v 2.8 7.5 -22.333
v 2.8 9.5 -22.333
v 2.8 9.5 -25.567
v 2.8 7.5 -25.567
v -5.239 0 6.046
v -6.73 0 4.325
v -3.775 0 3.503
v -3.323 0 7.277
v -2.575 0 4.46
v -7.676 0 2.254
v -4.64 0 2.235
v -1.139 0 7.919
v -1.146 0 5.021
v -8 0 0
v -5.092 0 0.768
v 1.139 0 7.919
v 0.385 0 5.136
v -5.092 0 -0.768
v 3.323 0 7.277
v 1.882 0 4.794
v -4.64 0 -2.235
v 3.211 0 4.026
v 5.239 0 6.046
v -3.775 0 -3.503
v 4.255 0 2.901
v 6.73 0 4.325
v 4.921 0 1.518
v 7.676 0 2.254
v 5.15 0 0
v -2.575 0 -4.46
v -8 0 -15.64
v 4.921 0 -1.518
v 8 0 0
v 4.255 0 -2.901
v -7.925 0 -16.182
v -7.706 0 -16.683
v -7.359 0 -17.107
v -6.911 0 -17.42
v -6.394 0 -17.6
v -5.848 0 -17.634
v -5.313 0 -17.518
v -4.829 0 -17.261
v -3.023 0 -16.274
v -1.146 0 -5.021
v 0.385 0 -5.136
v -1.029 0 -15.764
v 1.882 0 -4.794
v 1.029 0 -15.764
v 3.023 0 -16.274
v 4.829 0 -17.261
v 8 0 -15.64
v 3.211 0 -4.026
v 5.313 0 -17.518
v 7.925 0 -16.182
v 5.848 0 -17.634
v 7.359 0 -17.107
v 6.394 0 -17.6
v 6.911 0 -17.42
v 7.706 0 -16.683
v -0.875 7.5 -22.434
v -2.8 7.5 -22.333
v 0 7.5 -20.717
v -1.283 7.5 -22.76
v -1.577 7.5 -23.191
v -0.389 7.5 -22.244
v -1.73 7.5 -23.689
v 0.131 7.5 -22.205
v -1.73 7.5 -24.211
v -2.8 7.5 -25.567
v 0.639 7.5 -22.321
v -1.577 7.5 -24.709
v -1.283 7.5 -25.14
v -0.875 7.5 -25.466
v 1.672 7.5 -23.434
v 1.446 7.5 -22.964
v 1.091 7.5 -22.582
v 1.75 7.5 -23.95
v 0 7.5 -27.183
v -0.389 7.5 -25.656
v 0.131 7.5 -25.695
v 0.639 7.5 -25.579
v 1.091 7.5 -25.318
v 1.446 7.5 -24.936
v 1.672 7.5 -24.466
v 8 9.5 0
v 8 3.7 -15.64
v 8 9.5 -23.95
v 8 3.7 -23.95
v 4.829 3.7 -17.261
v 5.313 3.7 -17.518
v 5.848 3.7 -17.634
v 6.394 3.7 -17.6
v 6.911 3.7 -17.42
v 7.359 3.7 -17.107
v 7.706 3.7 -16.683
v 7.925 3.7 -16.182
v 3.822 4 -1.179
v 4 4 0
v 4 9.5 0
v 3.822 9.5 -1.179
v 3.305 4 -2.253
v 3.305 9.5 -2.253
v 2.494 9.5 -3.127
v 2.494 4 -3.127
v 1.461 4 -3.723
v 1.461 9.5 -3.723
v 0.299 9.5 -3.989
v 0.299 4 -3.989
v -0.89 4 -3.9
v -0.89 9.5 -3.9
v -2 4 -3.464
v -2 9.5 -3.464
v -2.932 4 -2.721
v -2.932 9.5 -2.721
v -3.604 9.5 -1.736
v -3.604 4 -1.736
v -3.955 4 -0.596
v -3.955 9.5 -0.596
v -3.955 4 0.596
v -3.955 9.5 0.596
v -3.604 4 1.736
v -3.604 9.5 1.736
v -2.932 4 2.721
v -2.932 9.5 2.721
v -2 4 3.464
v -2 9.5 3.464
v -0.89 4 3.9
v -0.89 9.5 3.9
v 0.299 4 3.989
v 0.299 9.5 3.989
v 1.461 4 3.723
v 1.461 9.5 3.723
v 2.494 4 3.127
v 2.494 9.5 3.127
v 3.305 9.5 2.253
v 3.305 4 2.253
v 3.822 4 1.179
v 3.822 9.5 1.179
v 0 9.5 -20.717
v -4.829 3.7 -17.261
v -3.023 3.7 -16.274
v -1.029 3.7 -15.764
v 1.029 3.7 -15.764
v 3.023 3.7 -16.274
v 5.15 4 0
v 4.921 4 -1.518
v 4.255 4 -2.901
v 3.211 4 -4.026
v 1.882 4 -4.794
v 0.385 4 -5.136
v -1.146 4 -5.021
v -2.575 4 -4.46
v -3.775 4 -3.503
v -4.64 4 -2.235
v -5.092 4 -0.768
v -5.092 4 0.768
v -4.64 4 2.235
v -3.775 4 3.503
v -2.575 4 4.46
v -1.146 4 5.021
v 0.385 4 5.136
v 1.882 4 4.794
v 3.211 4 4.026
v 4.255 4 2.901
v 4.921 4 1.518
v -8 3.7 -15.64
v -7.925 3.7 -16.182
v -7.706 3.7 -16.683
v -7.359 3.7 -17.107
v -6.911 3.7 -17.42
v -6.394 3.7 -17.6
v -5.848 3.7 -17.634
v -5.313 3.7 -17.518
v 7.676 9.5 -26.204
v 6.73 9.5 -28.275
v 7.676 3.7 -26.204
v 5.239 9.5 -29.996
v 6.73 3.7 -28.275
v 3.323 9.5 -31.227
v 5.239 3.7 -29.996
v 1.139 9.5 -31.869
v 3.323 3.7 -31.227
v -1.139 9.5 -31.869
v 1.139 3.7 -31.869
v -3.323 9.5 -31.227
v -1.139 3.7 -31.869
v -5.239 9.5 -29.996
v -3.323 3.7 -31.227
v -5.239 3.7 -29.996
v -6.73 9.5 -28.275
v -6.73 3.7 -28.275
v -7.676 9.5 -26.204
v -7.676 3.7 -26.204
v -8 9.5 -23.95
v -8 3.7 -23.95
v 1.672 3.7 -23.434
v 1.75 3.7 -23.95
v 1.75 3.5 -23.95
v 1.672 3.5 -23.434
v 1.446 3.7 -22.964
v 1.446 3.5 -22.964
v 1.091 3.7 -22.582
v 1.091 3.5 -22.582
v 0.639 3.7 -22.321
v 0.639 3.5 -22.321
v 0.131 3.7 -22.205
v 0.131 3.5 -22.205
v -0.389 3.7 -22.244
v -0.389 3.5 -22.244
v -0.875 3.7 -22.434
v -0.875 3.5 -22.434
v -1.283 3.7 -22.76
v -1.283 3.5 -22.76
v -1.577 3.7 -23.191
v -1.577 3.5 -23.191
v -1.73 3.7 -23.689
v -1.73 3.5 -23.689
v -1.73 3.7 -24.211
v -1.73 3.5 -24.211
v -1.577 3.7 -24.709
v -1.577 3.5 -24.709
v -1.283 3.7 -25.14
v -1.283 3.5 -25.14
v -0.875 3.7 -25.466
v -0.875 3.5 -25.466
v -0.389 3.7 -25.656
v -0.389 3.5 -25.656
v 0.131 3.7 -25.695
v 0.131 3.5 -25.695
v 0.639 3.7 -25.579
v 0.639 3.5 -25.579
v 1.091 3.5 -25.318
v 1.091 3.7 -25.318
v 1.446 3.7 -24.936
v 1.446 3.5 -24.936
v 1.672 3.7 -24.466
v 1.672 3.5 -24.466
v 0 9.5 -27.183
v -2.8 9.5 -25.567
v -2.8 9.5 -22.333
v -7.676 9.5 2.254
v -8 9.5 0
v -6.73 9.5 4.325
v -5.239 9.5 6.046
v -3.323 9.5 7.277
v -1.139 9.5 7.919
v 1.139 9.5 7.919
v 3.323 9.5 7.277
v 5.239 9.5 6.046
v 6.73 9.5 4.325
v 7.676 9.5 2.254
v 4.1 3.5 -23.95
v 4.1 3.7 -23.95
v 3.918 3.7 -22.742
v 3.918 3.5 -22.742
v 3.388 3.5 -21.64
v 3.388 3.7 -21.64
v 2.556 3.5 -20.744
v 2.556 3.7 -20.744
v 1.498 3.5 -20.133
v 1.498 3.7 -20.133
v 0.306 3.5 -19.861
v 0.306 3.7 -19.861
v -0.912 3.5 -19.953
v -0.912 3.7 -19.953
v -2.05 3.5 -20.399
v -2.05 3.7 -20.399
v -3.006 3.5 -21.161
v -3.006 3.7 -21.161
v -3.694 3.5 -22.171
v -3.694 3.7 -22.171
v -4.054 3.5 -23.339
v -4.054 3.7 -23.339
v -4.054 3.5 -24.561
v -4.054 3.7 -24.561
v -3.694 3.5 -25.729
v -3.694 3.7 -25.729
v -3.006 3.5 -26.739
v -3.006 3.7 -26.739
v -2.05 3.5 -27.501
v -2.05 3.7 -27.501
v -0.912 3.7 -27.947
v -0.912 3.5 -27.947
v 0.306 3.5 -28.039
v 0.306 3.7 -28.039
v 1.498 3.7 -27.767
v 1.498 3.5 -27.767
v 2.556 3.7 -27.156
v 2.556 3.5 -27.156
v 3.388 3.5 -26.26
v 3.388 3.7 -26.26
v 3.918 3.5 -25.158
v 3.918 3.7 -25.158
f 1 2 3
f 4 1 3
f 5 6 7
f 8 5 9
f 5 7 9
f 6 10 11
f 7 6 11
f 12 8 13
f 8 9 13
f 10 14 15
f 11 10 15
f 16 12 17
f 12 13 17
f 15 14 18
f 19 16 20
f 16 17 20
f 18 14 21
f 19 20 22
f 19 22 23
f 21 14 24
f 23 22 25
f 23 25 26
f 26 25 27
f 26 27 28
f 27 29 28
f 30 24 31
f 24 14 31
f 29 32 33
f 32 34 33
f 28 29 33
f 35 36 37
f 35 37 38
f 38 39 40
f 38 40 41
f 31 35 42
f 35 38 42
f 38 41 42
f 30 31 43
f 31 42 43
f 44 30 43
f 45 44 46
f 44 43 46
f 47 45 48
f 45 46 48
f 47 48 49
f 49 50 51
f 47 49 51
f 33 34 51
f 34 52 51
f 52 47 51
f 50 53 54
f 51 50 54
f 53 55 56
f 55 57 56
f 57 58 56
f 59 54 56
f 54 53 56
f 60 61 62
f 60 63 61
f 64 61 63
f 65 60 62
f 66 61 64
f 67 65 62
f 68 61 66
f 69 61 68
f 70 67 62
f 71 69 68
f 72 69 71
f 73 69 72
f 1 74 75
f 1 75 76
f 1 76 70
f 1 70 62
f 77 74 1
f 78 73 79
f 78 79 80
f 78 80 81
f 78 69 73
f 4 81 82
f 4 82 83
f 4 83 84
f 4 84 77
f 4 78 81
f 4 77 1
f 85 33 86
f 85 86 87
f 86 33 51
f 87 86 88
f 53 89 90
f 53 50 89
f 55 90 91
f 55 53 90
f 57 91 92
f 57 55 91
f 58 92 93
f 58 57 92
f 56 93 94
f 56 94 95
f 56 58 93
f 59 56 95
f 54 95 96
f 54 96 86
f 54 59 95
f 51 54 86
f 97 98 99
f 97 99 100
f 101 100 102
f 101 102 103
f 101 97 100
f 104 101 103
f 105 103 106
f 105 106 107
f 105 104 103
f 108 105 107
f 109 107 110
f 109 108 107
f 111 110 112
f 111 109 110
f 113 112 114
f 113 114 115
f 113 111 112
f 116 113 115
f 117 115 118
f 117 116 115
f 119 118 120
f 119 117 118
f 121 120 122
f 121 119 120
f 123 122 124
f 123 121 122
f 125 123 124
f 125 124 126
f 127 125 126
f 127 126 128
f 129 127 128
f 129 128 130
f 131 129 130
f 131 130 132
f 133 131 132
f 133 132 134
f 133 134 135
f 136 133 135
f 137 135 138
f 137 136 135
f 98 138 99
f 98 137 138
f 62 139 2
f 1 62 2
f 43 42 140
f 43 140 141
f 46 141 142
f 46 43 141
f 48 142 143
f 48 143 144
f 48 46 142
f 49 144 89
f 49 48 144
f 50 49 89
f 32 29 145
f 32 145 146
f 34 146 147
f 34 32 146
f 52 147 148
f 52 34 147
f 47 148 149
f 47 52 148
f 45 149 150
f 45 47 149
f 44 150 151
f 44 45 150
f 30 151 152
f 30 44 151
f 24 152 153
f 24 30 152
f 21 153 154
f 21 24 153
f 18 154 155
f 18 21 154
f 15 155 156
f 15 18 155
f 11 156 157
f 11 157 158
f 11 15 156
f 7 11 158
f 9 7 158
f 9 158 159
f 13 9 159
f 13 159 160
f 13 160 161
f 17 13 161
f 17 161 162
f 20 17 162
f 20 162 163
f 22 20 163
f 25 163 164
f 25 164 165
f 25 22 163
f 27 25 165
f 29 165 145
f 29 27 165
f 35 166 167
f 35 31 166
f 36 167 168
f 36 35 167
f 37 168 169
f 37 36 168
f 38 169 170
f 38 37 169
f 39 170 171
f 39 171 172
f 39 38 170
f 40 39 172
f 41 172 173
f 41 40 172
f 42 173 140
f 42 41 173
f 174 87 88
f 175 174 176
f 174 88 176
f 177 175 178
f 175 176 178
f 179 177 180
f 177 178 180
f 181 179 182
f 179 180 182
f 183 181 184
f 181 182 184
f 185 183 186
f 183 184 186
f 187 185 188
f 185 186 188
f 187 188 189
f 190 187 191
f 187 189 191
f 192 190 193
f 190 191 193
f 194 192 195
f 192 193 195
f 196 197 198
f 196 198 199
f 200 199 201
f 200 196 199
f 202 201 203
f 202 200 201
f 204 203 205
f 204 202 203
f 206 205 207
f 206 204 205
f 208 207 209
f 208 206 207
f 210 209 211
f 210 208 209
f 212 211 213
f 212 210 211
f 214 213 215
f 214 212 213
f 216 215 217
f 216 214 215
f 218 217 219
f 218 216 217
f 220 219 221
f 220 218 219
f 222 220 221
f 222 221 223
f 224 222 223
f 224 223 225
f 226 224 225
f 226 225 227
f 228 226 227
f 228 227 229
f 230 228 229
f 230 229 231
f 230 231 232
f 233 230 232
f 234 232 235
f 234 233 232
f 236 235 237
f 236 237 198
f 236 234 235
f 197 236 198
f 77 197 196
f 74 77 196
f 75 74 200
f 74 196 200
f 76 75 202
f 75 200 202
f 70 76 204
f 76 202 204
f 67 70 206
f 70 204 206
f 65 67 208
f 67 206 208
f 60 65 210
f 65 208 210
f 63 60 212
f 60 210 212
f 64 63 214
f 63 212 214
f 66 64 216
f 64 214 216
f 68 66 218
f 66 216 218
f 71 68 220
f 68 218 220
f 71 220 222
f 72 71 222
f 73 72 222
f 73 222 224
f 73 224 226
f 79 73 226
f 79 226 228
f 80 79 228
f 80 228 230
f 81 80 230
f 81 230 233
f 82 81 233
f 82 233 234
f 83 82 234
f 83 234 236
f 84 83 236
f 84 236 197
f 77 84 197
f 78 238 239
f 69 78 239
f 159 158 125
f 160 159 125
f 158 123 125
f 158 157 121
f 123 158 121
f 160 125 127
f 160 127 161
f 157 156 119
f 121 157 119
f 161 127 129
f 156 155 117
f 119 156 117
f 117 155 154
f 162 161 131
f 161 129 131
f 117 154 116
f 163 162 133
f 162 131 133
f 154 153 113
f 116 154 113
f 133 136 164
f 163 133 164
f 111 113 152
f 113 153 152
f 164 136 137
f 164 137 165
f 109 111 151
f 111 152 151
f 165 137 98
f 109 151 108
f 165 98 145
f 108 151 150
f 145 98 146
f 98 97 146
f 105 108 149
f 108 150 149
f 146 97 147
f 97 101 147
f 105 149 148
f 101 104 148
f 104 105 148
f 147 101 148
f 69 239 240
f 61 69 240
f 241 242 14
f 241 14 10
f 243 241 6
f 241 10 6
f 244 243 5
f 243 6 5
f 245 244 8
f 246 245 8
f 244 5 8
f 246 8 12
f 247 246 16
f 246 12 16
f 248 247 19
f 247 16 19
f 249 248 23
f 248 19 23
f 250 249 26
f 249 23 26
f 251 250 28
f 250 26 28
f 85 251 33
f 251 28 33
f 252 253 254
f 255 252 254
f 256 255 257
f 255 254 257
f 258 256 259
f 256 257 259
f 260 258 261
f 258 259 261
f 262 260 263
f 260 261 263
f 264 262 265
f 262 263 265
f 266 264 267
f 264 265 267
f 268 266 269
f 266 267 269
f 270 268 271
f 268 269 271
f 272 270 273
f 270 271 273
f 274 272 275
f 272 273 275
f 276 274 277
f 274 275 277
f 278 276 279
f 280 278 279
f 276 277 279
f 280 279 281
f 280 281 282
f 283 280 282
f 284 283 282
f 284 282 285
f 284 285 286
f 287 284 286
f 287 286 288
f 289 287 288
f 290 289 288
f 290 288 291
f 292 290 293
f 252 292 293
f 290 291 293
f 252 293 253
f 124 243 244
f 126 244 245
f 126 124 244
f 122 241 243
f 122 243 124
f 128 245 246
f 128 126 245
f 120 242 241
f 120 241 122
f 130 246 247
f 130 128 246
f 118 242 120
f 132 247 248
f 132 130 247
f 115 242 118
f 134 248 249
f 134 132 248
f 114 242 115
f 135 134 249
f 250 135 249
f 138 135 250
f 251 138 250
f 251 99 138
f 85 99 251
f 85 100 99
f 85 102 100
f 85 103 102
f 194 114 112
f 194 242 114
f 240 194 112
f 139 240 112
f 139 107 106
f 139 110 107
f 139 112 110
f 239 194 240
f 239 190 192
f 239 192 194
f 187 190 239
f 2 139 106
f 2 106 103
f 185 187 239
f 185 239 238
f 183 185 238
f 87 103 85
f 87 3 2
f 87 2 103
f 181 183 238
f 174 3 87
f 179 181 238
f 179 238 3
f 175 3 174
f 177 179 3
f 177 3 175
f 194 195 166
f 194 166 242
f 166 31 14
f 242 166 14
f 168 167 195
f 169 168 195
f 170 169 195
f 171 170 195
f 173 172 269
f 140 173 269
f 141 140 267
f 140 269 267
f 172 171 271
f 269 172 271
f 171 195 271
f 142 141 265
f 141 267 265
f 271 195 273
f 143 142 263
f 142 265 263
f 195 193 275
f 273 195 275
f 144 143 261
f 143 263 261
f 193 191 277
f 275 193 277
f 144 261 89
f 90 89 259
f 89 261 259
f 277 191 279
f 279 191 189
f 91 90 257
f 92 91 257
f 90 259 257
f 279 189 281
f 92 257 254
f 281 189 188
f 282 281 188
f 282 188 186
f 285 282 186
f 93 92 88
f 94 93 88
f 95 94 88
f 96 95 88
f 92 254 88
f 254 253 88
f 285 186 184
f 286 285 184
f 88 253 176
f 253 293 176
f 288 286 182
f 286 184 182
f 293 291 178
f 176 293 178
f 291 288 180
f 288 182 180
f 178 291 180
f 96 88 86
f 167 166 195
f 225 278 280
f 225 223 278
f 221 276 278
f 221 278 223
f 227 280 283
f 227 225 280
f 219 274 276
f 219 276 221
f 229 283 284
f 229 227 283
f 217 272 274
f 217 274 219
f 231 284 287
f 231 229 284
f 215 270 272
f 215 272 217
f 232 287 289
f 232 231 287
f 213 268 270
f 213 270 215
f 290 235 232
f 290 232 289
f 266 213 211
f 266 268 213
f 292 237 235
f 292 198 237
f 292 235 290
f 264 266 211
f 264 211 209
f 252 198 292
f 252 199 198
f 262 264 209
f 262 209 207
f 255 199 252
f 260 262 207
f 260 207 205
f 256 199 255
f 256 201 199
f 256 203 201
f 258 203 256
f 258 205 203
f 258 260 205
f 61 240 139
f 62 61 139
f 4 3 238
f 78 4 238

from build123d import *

# Parameters (mm, degrees)
SKETCH1_R           = 5.15
BOSS_EXTRUDE1_DEPTH = 4
SKETCH2_R           = 4
BOSS_EXTRUDE2_DEPTH = 5.5
SKETCH3_R           = 8.25
CUT_EXTRUDE1_DEPTH  = 3.7
CUT_EXTRUDE2_REACH  = 7.8
SKETCH4_R           = 1.75
SKETCH5_R           = 4.1
SKETCH5_R_2         = 1.75
BOSS_EXTRUDE3_DEPTH = 0.2
CUT_EXTRUDE3_DEPTH  = 2
FILLET1_R           = 2


with BuildPart() as part:
    # Sketch1 → Boss-Extrude1 (new body)
    with BuildSketch(Plane(origin=(0, 0, 0), x_dir=(1, 0, 0), z_dir=(0, 1, 0))):
        with BuildLine():
            Line((-8, 23.95), (-8, 0))
            ThreePointArc((-8, 0), (0, -8), (8, 0))
            Line((8, 0), (8, 23.95))
            ThreePointArc((8, 23.95), (0, 31.95), (-8, 23.95))
        make_face()
        Circle(SKETCH1_R, mode=Mode.SUBTRACT)
    extrude(amount=BOSS_EXTRUDE1_DEPTH)

    # Sketch2 → Boss-Extrude2 (add)
    with BuildSketch(Plane(origin=(0, 4, 0), x_dir=(1, 0, 0), z_dir=(0, 1, 0))):
        with BuildLine():
            Line((-8, 23.95), (-8, 0))
            ThreePointArc((-8, 0), (0, -8), (8, 0))
            Line((8, 0), (8, 23.95))
            ThreePointArc((8, 23.95), (0, 31.95), (-8, 23.95))
        make_face()
        Circle(SKETCH2_R, mode=Mode.SUBTRACT)
    extrude(amount=BOSS_EXTRUDE2_DEPTH)

    # Sketch3 → Cut-Extrude1 (cut)
    with BuildSketch(Plane(origin=(0, 0, 0), x_dir=(1, 0, 0), z_dir=(0, 1, 0))):
        with Locations((0, 23.95)):
            Circle(SKETCH3_R)
    extrude(amount=CUT_EXTRUDE1_DEPTH, mode=Mode.SUBTRACT)

    # Sketch4 → Cut-Extrude2 (cut, up to next)
    with BuildSketch(Plane.XZ.offset(-3.7), mode=Mode.PRIVATE) as cut_extrude2_sk1:
        with Locations((0, -23.95)):
            Circle(SKETCH4_R)
    cut_extrude2_tool1 = extrude(cut_extrude2_sk1.sketch, amount=-CUT_EXTRUDE2_REACH, mode=Mode.PRIVATE) & part.part
    add(cut_extrude2_tool1.solids().sort_by_distance((0, 3.7, -23.95))[0], mode=Mode.SUBTRACT)

    # Sketch5 → Boss-Extrude3 (add)
    with BuildSketch(Plane.XZ.offset(-3.7)):
        with Locations((0, -23.95)):
            Circle(SKETCH5_R)
        with Locations((0, -23.95)):
            Circle(SKETCH5_R_2, mode=Mode.SUBTRACT)
    extrude(amount=BOSS_EXTRUDE3_DEPTH)

    # Sketch6 → Cut-Extrude3 (cut)
    with BuildSketch(Plane(origin=(0, 9.5, 0), x_dir=(1, 0, 0), z_dir=(0, 1, 0))):
        Polygon((0, 20.716838493), (2.8, 22.333419246), (2.8, 25.566580754), (0, 27.183161507), (-2.8, 25.566580754), (-2.8, 22.333419246), align=None)
    extrude(amount=-CUT_EXTRUDE3_DEPTH, mode=Mode.SUBTRACT)

    # Fillet1
    fillet1_edges = [part.edges().sort_by_distance(p)[0] for p in [
        (8, 1.85, -21.934435563),
        (-8, 1.85, -21.934435563),
    ]]
    fillet(fillet1_edges, radius=FILLET1_R)


solid = part.part
